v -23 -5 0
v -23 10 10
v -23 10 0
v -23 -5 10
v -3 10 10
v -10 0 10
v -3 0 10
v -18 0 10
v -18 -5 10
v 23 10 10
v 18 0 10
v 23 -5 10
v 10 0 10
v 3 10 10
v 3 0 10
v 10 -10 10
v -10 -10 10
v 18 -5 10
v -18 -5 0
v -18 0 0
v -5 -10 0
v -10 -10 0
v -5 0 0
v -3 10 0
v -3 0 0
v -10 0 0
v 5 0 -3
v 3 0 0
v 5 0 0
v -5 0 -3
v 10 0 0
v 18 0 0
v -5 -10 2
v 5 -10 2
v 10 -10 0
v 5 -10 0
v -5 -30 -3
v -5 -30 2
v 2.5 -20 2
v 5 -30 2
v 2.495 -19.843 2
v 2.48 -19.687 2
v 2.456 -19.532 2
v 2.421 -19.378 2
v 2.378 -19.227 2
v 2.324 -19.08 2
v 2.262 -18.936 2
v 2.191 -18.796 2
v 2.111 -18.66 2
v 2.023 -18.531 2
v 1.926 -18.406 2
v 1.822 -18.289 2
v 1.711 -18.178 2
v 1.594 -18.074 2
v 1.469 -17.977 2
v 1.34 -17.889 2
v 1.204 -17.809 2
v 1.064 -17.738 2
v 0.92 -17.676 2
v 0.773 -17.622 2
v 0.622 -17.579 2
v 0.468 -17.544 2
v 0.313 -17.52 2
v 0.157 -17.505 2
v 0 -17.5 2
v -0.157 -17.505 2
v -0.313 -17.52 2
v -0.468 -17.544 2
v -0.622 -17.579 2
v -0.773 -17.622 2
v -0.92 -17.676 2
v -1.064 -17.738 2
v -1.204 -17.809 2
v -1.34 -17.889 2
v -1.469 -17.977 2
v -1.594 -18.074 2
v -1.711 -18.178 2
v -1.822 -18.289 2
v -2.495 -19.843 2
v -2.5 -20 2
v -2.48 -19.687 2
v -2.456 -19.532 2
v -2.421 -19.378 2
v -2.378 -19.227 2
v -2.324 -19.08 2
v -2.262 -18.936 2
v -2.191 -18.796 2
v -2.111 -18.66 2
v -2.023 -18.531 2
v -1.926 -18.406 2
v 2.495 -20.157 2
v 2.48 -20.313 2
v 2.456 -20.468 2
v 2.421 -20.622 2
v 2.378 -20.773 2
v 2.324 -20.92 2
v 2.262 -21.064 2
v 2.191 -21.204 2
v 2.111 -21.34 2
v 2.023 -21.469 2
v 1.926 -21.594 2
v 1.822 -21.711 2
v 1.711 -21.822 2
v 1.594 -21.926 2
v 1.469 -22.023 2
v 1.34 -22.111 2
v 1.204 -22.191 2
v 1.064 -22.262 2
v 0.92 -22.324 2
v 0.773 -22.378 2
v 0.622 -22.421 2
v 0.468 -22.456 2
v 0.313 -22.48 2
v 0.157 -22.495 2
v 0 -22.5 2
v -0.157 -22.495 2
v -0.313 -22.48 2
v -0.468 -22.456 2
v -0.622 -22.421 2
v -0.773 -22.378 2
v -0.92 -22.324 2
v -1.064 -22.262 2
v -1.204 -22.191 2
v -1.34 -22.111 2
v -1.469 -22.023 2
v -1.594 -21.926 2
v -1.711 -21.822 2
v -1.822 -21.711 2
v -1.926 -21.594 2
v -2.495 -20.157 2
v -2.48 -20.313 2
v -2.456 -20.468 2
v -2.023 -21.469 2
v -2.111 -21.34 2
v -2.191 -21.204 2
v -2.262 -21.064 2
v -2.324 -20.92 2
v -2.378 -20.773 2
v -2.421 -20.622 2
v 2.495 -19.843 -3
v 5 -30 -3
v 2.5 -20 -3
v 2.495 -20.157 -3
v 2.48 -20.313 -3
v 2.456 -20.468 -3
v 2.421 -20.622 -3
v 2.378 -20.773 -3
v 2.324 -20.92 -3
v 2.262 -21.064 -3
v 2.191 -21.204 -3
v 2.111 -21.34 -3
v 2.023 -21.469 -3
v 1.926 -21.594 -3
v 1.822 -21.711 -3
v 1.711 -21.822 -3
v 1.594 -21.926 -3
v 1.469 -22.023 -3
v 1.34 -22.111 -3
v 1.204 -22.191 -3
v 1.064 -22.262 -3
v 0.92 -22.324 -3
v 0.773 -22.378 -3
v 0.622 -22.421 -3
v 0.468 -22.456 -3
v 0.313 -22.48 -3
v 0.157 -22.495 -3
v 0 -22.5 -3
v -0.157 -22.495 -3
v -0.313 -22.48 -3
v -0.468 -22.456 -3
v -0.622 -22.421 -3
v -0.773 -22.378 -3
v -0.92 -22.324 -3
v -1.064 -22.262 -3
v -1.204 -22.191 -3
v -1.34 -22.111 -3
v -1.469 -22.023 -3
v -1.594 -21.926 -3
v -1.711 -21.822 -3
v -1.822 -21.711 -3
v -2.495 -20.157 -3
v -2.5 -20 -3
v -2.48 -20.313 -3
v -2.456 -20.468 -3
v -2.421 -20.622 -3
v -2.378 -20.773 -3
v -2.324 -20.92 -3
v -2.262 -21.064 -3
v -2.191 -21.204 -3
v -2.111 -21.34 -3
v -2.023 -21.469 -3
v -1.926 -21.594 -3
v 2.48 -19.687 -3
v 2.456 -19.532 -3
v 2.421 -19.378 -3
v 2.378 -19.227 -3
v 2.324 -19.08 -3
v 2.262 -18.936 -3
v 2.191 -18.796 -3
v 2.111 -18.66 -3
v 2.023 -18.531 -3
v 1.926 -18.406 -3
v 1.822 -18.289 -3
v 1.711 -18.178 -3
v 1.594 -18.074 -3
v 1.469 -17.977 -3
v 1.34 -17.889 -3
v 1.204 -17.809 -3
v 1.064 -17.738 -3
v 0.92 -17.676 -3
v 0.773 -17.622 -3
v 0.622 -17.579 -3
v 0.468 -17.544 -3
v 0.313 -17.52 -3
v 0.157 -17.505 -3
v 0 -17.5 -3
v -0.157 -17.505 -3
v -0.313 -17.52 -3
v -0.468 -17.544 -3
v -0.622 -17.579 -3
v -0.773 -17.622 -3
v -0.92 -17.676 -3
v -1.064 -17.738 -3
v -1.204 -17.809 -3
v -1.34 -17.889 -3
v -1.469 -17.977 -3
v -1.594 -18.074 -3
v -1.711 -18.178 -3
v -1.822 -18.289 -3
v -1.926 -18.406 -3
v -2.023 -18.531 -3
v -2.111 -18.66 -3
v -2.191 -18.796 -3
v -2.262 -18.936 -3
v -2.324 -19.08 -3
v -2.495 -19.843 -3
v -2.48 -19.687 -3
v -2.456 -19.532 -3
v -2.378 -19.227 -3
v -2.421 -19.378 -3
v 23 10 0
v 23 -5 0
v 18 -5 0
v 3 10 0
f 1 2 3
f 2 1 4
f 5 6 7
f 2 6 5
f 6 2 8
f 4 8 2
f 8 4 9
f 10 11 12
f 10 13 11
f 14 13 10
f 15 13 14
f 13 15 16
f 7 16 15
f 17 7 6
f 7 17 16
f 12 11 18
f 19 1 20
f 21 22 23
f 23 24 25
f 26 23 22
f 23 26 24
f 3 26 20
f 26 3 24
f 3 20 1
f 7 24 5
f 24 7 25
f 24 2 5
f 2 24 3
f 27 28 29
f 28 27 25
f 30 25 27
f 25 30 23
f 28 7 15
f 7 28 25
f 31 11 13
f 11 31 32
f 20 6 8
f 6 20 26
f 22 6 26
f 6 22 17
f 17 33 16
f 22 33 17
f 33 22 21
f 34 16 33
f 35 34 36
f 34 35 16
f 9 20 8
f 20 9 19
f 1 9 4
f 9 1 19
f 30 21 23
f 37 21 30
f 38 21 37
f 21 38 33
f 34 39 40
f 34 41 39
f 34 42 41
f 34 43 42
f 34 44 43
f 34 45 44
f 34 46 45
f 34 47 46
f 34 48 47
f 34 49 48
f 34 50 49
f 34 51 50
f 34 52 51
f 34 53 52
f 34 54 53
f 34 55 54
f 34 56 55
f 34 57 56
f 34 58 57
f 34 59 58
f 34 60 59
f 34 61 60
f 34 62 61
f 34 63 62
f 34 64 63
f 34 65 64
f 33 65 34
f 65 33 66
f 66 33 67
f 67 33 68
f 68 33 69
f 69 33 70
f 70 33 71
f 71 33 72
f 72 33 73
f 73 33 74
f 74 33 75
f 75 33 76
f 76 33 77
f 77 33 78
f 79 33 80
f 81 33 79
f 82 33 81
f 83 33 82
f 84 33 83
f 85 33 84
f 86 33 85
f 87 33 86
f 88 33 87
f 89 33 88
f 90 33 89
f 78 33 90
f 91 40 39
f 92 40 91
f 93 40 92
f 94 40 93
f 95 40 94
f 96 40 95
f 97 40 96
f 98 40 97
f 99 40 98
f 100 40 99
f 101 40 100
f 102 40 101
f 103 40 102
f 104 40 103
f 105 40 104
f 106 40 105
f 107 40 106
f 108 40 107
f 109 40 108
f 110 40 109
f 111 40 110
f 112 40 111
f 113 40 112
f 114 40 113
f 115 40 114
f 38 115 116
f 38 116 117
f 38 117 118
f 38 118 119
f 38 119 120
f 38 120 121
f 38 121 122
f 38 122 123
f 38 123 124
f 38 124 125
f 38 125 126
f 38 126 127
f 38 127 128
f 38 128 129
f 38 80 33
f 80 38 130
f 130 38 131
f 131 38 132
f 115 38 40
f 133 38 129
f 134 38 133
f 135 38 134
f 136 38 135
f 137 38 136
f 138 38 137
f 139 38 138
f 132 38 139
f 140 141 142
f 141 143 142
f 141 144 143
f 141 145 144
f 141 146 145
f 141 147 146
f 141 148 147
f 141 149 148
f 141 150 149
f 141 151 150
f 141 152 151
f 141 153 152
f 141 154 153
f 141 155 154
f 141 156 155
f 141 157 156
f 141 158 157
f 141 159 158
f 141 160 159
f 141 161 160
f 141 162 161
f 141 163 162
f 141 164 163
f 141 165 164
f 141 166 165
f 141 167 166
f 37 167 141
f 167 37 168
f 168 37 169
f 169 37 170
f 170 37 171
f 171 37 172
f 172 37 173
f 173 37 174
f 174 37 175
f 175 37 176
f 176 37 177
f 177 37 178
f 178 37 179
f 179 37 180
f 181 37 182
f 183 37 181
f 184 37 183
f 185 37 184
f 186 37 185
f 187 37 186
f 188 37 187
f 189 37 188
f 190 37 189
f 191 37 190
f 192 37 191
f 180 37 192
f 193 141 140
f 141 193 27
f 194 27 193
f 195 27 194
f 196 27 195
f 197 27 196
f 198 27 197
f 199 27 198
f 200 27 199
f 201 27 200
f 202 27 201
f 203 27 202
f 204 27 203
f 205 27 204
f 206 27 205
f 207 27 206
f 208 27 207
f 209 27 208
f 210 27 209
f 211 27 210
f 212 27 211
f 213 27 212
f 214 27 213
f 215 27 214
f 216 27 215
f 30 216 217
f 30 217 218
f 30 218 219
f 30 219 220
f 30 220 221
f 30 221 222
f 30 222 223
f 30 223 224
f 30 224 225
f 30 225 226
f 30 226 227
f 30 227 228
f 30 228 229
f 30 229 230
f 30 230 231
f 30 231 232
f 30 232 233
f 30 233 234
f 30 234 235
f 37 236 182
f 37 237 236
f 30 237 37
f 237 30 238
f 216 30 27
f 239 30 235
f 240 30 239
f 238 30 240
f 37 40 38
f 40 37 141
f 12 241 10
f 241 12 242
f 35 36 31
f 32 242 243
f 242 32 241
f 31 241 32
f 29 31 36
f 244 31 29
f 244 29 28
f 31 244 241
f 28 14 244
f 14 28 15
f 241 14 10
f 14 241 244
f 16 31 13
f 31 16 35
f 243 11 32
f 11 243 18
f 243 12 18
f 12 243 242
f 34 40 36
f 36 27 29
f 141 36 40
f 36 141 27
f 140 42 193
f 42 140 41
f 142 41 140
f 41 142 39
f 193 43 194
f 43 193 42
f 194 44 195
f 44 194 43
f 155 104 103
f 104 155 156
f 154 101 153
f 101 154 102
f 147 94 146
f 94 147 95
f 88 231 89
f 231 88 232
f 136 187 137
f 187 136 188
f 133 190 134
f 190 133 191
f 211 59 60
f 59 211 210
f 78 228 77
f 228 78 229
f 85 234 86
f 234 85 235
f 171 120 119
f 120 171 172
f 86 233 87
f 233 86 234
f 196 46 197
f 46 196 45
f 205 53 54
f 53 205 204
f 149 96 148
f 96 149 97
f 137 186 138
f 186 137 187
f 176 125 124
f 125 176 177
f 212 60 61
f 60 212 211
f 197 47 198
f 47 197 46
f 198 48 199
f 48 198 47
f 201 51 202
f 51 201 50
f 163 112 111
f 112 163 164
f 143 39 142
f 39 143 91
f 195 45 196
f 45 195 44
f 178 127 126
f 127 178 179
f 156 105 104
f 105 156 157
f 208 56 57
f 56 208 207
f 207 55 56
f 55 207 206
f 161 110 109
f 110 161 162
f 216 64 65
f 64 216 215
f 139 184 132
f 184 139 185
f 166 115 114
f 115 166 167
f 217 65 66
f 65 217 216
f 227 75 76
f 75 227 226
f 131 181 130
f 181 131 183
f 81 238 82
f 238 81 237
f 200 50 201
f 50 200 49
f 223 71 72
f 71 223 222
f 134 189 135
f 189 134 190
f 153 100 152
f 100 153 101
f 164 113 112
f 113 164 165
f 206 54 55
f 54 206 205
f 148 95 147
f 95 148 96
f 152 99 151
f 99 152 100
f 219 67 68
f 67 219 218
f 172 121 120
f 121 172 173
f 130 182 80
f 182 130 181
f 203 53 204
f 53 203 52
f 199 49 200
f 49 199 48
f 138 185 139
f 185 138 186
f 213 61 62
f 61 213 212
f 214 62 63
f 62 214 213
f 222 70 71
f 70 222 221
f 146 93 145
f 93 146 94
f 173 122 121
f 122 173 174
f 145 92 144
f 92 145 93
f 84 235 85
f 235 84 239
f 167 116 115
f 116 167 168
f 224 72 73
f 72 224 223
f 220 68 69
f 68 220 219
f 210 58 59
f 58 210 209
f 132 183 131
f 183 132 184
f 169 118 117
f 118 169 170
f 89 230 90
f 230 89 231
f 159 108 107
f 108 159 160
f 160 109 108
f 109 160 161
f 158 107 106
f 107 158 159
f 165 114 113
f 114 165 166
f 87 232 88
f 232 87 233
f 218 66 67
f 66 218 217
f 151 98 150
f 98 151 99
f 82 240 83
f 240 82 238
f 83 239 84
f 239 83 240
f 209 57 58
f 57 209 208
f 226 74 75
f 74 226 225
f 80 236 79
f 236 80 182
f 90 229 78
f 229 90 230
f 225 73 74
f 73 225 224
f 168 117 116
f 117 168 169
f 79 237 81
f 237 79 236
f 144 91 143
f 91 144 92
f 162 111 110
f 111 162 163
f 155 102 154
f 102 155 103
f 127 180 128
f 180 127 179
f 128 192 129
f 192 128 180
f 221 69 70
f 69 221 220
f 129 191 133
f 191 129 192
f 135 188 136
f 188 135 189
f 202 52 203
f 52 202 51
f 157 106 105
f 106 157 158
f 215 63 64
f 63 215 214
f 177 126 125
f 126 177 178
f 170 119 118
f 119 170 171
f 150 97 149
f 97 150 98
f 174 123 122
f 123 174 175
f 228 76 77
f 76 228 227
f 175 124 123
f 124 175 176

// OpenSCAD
$fn = 100;

difference() {
  union() {
    translate([3, 0, 0]) cube([20, 10, 10]);
    translate([0, -10, 0]) cube([10, 10, 10]);
    translate([18, -5, 0]) cube([5, 5, 10]);
    translate([0, -30, -3]) cube([5, 30, 5]);
    mirror([1, 0, 0]) {
      translate([3, 0, 0]) cube([20, 10, 10]);
      translate([0, -10, 0]) cube([10, 10, 10]);
      translate([18, -5, 0]) cube([5, 5, 10]);
      translate([0, -30, -3]) cube([5, 30, 5]);
    }
  }
  translate([0, -20, -20]) cylinder(d=5, h=30);
}
